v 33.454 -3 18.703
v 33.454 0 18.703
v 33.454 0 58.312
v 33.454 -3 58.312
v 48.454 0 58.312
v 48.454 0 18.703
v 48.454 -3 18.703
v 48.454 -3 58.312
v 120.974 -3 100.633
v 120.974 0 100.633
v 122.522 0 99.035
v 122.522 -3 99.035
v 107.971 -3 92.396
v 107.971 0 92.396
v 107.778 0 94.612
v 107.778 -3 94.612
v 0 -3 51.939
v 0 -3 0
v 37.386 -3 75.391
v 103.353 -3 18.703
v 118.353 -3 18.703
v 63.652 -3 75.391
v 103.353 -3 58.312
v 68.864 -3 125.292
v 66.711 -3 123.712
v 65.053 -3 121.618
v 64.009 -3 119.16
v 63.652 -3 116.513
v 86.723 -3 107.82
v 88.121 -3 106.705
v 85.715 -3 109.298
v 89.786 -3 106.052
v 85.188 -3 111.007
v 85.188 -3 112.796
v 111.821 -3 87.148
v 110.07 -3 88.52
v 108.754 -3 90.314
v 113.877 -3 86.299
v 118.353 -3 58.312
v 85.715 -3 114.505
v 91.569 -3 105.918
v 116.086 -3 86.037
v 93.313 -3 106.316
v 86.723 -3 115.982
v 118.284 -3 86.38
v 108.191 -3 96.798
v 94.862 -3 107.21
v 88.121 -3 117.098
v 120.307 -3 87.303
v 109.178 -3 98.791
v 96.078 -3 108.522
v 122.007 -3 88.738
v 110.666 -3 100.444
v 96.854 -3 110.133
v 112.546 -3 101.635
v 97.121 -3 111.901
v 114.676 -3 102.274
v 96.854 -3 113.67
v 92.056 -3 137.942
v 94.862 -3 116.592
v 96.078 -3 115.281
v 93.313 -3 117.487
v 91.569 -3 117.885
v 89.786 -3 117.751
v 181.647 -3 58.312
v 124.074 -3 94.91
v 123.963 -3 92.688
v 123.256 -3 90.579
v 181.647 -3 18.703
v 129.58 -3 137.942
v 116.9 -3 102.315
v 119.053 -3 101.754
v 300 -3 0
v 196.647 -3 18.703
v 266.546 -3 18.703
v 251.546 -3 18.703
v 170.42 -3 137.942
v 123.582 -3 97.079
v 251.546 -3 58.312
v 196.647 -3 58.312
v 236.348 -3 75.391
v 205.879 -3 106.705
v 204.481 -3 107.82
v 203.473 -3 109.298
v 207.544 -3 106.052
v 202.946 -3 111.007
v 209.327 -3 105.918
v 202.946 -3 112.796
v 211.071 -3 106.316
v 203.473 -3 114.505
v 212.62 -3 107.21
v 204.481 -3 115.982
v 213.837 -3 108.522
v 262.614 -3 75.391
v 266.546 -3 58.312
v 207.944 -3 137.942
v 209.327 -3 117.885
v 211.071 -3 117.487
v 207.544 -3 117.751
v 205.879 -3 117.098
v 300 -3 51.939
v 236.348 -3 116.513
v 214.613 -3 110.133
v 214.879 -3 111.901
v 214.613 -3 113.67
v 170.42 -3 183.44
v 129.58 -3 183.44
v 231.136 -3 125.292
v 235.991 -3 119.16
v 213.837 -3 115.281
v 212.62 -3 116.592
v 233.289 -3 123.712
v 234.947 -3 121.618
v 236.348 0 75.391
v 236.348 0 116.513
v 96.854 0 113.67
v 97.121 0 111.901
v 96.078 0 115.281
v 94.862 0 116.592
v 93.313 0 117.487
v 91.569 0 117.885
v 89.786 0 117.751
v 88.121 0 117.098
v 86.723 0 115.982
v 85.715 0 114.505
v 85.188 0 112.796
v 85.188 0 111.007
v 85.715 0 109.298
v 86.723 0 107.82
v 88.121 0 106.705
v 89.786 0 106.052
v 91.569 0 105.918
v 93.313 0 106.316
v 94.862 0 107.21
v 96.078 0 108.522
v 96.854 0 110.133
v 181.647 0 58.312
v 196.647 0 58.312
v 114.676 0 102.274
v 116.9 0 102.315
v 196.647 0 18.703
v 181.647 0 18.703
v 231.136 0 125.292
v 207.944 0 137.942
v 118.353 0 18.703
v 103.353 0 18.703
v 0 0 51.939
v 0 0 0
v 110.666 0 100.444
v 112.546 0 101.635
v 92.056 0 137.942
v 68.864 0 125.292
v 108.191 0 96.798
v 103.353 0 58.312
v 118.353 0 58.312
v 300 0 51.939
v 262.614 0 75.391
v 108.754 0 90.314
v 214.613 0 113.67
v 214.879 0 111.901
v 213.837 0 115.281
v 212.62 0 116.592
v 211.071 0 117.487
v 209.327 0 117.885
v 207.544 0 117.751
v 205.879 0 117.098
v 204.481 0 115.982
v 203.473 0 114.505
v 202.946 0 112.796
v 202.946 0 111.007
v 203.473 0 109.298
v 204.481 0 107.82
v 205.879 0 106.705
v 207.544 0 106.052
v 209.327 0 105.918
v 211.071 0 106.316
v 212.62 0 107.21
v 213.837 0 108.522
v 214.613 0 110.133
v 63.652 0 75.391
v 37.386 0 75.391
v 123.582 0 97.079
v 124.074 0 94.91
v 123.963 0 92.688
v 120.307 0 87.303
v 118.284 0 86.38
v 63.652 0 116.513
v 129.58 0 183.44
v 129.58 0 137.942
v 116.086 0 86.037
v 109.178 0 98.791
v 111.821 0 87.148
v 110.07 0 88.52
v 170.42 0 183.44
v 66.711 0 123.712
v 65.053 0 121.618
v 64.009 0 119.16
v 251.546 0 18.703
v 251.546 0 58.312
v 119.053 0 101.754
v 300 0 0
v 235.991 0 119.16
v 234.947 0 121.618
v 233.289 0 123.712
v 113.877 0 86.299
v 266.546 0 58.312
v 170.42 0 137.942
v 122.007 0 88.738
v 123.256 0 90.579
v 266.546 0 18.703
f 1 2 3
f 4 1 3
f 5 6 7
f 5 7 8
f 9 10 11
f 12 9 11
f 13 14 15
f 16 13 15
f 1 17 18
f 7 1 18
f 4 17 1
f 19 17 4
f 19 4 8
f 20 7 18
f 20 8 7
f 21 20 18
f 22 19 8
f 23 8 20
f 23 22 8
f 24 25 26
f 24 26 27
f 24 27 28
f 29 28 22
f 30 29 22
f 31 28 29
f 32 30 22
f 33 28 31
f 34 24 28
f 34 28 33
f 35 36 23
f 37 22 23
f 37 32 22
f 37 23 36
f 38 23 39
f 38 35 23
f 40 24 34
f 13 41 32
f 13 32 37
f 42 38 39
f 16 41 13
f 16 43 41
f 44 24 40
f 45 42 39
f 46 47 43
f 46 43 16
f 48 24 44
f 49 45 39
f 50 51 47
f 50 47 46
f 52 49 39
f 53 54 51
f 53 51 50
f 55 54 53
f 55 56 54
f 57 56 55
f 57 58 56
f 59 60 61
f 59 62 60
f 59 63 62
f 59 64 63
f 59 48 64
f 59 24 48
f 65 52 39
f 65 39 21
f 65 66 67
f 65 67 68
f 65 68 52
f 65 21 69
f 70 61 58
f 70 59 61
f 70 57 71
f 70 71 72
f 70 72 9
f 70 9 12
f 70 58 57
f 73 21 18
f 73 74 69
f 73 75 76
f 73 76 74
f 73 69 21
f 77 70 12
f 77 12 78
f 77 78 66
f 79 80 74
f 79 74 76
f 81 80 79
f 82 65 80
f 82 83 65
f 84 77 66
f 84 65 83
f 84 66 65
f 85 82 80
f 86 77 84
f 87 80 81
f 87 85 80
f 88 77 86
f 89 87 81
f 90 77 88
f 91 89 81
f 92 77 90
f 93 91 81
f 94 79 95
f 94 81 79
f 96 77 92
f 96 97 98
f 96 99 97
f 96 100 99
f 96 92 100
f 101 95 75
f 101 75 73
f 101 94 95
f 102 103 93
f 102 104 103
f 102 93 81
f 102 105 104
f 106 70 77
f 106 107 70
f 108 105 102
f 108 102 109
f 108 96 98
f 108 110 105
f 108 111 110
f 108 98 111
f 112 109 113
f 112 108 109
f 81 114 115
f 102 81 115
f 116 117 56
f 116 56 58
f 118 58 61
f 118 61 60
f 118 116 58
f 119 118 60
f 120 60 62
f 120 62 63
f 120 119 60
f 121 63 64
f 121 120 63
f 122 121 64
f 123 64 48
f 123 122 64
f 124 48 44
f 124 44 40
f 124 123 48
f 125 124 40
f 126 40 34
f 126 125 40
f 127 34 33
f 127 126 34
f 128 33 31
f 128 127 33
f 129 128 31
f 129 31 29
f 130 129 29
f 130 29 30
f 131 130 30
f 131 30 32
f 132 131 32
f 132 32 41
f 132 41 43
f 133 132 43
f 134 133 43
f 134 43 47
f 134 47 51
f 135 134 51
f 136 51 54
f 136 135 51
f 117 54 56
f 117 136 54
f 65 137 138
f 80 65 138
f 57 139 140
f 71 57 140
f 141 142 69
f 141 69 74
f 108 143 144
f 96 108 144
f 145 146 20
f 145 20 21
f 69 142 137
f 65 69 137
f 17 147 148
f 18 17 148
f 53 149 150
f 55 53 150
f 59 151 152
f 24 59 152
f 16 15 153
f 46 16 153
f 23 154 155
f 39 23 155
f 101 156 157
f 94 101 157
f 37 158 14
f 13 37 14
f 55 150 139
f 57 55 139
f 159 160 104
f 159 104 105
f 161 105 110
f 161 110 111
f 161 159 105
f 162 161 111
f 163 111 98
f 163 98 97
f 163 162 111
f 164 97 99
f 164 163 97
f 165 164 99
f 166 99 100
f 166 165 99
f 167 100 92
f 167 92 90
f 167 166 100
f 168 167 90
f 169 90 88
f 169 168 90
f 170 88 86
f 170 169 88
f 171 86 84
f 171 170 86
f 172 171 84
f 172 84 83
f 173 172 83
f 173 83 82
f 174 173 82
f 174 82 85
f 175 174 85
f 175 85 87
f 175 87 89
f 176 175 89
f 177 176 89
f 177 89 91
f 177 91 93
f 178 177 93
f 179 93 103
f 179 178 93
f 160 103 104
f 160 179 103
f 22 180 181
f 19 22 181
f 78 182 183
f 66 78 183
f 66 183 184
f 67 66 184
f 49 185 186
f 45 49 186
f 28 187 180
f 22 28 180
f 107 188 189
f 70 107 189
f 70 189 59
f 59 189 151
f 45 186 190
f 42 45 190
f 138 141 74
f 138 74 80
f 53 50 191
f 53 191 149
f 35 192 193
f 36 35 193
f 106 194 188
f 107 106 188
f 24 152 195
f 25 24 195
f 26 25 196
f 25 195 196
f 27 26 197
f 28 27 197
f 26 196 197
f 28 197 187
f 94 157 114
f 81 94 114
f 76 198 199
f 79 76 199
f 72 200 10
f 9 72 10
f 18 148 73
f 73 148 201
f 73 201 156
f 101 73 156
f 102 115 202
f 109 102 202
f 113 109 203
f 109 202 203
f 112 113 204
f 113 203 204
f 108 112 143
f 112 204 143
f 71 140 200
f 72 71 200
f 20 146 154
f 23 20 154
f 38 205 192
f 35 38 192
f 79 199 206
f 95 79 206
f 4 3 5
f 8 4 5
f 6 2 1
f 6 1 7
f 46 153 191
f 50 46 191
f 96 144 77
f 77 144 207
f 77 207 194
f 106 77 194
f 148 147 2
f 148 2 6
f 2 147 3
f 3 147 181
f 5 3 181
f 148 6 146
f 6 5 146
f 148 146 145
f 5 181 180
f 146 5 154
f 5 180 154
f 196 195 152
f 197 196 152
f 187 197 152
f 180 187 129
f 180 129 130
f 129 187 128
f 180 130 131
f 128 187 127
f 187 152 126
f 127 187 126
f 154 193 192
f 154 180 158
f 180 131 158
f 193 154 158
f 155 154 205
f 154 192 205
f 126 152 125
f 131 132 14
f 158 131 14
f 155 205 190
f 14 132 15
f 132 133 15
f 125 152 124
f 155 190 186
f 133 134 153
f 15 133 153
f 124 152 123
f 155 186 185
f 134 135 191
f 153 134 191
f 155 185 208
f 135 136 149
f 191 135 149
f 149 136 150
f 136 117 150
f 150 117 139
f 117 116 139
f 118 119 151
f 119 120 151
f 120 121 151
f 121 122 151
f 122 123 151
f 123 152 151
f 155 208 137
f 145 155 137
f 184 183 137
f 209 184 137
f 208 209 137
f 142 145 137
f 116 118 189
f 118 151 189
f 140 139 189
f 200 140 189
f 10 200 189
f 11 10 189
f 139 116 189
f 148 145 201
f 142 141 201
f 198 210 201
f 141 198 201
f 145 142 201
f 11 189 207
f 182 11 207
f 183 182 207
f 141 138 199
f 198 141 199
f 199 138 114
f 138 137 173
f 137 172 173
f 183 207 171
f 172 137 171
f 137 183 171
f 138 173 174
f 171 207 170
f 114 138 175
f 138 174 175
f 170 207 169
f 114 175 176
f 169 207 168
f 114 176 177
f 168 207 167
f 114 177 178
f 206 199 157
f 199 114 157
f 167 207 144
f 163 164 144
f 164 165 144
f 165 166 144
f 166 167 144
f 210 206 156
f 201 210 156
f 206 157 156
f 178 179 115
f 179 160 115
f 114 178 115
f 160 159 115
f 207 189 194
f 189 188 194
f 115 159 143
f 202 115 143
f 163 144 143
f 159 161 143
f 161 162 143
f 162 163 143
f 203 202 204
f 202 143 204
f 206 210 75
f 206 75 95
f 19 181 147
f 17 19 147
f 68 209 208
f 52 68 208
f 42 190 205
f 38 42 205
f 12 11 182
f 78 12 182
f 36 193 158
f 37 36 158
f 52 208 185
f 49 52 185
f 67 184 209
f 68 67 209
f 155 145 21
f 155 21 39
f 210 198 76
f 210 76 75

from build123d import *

# Parameters (mm, degrees)
F0_W     = 15
F0_H     = 39.609302
F0_R     = 6
F1_DEPTH = 3


with BuildPart() as f1:
    # F0 (on Front) → F1 (new body)
    with BuildSketch(Plane.XZ):
        with BuildLine():
            Line((0, 51.938787), (0, 0))
            Line((0, 0), (150, 0))
            Line((150, 0), (300, 0))
            Line((300, 0), (300, 51.938787))
            Line((300, 51.938787), (262.61416, 75.391136))
            Line((262.61416, 75.391136), (236.347529, 75.391136))
            Line((236.347529, 75.391136), (236.347529, 116.513391))
            ThreePointArc((236.347529, 116.513391), (234.946518, 121.618035), (231.13605, 125.292346))
            Line((231.13605, 125.292346), (207.944199, 137.942446))
            Line((207.944199, 137.942446), (170.420438, 137.942446))
            Line((170.420438, 137.942446), (170.420438, 183.440013))
            Line((170.420438, 183.440013), (150, 183.440013))
            Line((150, 183.440013), (129.579562, 183.440013))
            Line((129.579562, 183.440013), (129.579562, 137.942446))
            Line((129.579562, 137.942446), (92.055801, 137.942446))
            Line((92.055801, 137.942446), (68.86395, 125.292346))
            ThreePointArc((68.86395, 125.292346), (65.053482, 121.618035), (63.652471, 116.513391))
            Line((63.652471, 116.513391), (63.652471, 75.391136))
            Line((63.652471, 75.391136), (37.38584, 75.391136))
            Line((37.38584, 75.391136), (0, 51.938787))
        make_face()
        with Locations((40.954411, 38.507754)):
            Rectangle(F0_W, F0_H, mode=Mode.SUBTRACT)
        with Locations((110.85318, 38.507754)):
            Rectangle(F0_W, F0_H, mode=Mode.SUBTRACT)
        with Locations((189.14682, 38.507754)):
            Rectangle(F0_W, F0_H, mode=Mode.SUBTRACT)
        with Locations((259.045589, 38.507754)):
            Rectangle(F0_W, F0_H, mode=Mode.SUBTRACT)
        with Locations((91.120891, 111.901462)):
            Circle(F0_R, mode=Mode.SUBTRACT)
        Polygon((116.900374, 102.314752), (119.052999, 101.753865), (120.974473, 100.633006), (122.52229, 99.035304), (123.581654, 97.079253), (124.073999, 94.909925), (123.962808, 92.688209), (123.256328, 90.578878), (122.006956, 88.738374), (120.307352, 87.303197), (118.283568, 86.379787), (116.085698, 86.036631), (113.876749, 86.299178), (111.820548, 87.147956), (110.069594, 88.520016), (108.753747, 90.313598), (107.970599, 92.39568), (107.77823, 94.611844), (108.190909, 96.797727), (109.178029, 98.791212), (110.66638, 100.444451), (112.545577, 101.634832), (114.676249, 102.274068), align=None, mode=Mode.SUBTRACT)
        with Locations((208.879109, 111.901462)):
            Circle(F0_R, mode=Mode.SUBTRACT)
    extrude(amount=F1_DEPTH)


solid = f1.part
